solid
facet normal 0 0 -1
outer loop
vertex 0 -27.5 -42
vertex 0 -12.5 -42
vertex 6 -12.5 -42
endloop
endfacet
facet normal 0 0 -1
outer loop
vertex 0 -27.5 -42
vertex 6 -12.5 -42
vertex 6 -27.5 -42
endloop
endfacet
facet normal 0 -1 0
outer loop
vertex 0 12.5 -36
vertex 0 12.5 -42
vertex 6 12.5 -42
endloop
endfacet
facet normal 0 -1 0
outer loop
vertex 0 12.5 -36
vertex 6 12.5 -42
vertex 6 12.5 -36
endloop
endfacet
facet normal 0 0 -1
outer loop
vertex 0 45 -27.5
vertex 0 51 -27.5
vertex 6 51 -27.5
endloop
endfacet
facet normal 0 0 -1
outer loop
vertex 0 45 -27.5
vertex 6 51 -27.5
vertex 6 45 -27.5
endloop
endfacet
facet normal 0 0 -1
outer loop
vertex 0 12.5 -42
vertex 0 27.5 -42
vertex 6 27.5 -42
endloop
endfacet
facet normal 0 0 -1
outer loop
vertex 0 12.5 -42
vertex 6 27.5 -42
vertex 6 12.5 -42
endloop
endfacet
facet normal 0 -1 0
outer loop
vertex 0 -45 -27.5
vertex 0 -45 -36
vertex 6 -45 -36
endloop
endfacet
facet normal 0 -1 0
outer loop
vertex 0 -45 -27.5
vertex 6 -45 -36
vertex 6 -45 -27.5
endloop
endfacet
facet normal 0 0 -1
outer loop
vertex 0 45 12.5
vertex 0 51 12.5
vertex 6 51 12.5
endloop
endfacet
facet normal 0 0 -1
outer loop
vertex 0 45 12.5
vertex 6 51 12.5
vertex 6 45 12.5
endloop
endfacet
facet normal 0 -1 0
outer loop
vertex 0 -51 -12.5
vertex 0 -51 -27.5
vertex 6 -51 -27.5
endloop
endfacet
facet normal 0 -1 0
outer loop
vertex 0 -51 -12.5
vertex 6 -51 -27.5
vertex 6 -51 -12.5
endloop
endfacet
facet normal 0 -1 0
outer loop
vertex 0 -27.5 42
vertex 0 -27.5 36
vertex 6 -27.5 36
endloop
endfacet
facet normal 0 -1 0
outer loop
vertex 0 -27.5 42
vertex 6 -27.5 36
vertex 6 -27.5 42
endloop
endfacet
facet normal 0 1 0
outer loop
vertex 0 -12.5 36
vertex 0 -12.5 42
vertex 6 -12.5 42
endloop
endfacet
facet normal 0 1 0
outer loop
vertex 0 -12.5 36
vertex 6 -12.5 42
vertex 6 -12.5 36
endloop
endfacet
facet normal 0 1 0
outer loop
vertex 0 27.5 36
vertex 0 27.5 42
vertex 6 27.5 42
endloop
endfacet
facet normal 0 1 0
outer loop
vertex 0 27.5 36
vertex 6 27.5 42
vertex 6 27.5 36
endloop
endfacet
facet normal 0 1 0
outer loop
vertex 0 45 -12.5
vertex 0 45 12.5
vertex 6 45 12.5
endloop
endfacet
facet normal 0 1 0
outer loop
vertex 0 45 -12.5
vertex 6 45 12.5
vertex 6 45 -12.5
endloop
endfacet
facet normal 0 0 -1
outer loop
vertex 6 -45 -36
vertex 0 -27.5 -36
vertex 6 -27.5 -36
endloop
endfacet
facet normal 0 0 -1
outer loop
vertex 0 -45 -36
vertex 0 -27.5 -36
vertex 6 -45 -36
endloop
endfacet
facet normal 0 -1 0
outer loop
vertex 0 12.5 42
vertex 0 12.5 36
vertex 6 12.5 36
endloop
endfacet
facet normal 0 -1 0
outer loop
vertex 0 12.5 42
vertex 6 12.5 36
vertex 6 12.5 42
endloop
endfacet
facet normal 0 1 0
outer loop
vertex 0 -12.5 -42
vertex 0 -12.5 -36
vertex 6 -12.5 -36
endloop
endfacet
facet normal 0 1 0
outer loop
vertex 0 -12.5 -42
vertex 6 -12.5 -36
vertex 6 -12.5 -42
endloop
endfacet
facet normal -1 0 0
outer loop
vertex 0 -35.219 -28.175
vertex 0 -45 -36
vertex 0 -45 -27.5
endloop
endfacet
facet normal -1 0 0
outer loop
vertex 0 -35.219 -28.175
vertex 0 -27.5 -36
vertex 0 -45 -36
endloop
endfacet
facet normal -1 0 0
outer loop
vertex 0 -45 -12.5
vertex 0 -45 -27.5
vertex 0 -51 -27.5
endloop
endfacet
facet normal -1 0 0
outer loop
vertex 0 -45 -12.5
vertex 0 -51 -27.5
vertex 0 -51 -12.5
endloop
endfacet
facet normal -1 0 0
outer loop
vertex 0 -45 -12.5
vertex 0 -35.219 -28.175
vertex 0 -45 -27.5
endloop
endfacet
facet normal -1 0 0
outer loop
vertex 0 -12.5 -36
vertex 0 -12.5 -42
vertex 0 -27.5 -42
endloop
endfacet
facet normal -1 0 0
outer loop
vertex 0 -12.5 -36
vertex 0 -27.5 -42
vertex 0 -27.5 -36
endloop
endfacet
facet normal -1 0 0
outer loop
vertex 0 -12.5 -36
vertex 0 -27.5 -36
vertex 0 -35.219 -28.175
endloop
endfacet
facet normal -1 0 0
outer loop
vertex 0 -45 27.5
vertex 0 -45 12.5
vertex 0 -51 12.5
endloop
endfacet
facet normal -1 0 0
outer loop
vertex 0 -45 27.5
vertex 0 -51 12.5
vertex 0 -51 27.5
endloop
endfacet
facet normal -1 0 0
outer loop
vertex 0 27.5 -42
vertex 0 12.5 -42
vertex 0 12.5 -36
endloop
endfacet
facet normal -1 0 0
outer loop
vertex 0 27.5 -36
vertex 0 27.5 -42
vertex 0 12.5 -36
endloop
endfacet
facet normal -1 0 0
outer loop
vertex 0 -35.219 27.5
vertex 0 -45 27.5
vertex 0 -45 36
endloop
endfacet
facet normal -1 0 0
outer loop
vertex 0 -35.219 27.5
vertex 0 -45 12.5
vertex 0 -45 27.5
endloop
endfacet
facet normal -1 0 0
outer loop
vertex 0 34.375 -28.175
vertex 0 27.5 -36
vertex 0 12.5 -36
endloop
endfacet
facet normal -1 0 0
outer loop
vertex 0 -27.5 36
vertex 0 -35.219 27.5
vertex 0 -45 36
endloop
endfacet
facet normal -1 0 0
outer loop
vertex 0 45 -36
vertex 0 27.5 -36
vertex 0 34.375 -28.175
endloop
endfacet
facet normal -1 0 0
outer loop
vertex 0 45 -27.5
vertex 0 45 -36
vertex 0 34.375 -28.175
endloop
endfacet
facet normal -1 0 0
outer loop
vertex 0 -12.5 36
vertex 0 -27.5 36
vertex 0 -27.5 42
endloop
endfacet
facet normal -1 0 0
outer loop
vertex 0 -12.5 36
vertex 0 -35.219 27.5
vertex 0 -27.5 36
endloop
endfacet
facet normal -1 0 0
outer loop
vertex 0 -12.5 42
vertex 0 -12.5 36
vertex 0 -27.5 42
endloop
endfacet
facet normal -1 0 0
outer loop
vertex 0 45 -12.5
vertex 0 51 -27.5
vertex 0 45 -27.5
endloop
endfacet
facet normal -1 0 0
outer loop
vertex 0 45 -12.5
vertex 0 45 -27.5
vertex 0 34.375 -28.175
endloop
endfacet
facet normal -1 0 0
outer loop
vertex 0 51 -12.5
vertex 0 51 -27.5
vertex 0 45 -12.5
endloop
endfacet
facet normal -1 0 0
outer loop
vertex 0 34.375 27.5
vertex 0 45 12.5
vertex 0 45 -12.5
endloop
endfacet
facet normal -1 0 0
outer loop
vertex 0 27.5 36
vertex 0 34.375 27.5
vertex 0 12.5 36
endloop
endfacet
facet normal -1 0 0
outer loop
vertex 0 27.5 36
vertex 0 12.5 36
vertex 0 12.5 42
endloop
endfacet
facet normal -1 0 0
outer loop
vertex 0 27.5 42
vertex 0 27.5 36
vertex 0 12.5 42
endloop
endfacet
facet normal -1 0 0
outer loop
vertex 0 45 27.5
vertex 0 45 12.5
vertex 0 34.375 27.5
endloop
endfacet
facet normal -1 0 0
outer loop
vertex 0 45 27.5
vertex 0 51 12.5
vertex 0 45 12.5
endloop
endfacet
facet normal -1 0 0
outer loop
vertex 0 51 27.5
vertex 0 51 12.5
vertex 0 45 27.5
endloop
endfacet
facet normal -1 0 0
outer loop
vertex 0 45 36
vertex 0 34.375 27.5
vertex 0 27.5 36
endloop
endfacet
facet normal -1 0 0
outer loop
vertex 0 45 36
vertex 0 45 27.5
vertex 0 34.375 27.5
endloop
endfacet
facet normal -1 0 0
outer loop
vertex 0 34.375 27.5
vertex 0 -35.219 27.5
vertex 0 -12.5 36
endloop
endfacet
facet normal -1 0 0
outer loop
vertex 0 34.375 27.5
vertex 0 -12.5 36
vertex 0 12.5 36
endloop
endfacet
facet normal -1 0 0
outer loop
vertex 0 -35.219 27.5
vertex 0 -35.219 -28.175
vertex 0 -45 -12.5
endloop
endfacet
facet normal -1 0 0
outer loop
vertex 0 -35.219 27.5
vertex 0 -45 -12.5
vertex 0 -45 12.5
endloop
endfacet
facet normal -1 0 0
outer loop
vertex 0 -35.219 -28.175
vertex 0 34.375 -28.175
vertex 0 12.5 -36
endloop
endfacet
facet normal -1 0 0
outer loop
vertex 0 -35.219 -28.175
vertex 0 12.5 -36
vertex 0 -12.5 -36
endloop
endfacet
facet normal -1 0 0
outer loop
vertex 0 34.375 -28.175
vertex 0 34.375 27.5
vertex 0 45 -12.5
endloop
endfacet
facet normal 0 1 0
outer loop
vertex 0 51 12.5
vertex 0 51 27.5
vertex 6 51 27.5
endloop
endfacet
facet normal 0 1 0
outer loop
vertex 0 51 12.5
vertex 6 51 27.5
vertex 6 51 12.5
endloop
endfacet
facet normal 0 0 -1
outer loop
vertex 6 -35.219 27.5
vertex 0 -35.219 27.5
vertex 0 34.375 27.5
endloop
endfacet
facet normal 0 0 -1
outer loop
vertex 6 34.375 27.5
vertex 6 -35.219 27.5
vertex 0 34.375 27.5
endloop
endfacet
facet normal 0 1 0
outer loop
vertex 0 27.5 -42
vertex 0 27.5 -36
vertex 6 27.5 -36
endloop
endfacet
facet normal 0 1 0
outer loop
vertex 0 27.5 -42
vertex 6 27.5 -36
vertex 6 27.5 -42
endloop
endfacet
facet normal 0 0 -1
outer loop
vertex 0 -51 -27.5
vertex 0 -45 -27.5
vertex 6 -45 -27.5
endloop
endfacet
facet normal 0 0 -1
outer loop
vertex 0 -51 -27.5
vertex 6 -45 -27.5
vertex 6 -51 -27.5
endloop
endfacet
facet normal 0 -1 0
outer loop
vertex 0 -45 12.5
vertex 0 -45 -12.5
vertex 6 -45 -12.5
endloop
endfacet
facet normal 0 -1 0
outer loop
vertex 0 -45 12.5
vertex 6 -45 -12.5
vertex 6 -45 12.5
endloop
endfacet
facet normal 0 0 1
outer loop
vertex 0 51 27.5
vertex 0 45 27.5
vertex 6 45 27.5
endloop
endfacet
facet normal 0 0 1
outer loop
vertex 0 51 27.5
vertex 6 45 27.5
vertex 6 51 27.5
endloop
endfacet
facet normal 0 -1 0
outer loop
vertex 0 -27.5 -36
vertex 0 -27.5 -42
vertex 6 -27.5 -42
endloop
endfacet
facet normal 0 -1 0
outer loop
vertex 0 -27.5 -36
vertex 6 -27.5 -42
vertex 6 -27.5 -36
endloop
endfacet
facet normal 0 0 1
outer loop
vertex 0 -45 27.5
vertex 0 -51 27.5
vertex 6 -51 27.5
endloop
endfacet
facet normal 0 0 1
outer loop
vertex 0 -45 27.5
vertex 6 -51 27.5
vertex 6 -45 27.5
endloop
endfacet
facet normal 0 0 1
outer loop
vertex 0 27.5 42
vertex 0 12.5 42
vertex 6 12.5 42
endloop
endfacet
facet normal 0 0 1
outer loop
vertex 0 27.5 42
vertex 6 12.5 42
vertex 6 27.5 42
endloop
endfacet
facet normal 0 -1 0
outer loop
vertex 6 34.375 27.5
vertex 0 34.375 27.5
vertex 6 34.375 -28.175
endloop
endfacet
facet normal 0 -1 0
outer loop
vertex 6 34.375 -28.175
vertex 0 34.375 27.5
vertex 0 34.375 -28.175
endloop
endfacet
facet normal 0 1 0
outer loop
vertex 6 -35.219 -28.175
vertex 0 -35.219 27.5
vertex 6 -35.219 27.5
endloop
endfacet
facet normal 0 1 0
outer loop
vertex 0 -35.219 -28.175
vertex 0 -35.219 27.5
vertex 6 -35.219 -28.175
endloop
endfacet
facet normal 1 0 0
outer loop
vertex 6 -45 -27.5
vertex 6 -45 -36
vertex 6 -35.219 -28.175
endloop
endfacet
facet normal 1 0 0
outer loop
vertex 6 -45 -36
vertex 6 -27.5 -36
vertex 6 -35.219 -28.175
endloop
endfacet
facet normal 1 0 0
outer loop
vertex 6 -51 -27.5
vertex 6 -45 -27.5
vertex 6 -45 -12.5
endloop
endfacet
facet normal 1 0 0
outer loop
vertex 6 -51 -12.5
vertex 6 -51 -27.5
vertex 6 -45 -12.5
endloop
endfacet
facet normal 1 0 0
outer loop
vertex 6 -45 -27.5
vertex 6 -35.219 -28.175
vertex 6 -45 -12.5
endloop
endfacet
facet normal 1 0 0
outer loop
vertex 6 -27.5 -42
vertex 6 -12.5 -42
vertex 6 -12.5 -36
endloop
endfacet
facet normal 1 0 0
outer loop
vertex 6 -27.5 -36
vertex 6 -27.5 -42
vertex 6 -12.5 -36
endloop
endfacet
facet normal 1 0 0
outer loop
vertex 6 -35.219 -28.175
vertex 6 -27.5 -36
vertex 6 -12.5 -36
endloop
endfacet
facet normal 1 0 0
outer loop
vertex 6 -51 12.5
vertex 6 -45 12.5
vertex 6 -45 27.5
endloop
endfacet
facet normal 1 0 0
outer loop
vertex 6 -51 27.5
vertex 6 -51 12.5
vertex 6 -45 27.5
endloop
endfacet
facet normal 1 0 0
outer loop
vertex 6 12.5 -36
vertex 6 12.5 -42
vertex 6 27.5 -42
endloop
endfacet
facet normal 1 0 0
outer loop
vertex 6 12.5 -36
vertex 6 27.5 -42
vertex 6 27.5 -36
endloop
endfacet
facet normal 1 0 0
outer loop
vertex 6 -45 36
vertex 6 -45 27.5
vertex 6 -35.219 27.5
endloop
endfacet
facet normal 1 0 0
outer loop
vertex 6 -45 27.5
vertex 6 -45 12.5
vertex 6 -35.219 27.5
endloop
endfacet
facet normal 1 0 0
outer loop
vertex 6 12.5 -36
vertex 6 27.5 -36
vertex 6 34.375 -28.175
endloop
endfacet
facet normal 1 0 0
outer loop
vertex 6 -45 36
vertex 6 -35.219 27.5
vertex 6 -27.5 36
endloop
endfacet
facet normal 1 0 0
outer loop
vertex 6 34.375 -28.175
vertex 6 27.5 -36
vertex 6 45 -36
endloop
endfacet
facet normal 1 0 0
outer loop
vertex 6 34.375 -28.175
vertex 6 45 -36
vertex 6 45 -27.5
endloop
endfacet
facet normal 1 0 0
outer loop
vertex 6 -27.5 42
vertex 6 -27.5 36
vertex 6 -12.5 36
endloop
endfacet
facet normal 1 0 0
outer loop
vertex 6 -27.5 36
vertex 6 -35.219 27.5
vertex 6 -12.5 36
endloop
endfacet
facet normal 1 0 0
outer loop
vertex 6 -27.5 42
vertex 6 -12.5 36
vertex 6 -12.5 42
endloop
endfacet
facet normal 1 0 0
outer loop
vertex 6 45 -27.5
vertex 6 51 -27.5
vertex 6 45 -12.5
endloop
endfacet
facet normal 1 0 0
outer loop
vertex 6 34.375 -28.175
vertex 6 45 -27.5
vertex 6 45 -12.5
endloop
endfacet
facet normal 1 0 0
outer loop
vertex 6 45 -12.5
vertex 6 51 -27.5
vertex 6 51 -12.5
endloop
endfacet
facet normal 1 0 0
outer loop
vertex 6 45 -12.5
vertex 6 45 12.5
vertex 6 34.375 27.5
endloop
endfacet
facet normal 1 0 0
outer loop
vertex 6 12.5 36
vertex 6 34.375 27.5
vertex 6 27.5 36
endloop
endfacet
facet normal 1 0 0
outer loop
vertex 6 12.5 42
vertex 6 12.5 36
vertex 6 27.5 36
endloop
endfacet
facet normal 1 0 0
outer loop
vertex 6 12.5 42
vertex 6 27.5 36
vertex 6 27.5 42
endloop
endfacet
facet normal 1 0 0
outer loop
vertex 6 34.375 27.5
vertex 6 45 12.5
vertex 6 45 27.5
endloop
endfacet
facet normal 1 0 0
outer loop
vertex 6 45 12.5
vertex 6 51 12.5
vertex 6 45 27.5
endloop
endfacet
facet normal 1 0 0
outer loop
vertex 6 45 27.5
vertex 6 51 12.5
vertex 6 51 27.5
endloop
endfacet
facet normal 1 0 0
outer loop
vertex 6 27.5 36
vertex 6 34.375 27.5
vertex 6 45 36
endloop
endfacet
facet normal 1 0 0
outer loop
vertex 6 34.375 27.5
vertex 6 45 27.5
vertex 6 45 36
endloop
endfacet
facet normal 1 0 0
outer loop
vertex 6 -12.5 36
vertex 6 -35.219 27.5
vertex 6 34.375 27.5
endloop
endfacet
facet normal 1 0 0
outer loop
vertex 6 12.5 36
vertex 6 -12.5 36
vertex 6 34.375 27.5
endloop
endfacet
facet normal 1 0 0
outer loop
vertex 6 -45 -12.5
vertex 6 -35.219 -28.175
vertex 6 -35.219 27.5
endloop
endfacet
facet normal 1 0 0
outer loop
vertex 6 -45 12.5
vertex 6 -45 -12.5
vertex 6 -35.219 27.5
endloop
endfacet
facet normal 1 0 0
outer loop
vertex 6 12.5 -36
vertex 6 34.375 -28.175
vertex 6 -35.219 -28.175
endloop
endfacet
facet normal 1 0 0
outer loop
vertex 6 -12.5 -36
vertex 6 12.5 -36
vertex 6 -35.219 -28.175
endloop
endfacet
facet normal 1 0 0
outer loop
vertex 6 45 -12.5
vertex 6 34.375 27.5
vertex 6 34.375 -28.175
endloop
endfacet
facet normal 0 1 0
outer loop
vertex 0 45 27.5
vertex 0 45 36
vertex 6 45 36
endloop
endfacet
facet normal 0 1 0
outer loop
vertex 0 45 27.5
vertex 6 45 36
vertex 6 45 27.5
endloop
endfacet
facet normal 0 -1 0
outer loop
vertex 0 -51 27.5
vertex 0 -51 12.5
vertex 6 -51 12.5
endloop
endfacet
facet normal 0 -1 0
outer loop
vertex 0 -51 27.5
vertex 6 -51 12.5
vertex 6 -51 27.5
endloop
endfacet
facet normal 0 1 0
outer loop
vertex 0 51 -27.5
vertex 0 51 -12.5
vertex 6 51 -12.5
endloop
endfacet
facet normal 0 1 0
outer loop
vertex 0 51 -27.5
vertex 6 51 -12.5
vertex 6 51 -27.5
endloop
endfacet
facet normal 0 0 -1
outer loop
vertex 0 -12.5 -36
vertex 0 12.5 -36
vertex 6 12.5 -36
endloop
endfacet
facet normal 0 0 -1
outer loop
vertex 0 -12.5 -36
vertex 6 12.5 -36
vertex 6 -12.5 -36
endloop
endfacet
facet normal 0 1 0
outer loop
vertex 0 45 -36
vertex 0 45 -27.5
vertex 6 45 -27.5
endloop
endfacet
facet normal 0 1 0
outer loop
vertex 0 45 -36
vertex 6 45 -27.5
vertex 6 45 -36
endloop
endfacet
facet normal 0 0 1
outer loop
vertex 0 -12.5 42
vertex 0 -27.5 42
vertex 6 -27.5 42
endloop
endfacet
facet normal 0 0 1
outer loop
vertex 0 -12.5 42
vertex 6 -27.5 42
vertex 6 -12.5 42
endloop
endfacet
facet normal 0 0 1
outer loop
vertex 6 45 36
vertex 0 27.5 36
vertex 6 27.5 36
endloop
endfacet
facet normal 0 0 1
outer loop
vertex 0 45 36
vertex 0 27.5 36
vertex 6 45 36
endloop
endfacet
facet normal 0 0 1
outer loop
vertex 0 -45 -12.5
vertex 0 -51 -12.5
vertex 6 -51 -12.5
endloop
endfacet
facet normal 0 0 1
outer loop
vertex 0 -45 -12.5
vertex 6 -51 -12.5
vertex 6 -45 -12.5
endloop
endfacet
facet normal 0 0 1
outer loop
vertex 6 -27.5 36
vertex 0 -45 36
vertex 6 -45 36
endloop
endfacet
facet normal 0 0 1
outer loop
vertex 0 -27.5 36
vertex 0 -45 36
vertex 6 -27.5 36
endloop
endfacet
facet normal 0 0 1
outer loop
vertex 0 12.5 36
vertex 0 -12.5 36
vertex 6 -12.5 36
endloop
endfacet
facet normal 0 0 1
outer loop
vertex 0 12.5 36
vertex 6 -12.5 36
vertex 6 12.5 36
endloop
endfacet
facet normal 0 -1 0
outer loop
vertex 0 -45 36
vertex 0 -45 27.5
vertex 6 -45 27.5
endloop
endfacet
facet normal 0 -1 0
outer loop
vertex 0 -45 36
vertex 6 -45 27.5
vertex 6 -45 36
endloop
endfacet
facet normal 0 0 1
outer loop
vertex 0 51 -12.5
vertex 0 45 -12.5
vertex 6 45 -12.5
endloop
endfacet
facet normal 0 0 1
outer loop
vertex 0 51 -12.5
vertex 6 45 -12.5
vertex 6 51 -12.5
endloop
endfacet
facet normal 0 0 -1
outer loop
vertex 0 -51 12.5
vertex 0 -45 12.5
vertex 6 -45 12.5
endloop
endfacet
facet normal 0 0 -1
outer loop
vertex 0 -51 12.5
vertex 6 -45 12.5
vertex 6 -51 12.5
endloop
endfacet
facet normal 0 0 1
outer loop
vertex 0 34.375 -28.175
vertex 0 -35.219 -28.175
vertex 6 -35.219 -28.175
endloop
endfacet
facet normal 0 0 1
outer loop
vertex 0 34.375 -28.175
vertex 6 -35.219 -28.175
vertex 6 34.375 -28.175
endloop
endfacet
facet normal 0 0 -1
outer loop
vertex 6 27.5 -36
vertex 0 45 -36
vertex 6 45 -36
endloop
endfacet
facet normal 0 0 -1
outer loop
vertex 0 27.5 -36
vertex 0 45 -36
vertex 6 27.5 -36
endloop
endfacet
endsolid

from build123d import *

# Parameters (mm, degrees)
SKETCH1_W           = 55.675357375
SKETCH1_H           = 69.594196719
BOSS_EXTRUDE1_DEPTH = 6


with BuildPart() as part:
    # Sketch1 → Boss-Extrude1 (new body)
    with BuildSketch(Plane(origin=(0, 0, 0), x_dir=(0, 0, -1), z_dir=(1, 0, 0))):
        Polygon((36, -45), (27.5, -45), (27.5, -51), (12.5, -51), (12.5, -45), (-12.5, -45), (-12.5, -51), (-27.5, -51), (-27.5, -45), (-36, -45), (-36, -27.5), (-42, -27.5), (-42, -12.5), (-36, -12.5), (-36, 12.5), (-42, 12.5), (-42, 27.5), (-36, 27.5), (-36, 45), (-27.5, 45), (-27.5, 51), (-12.5, 51), (-12.5, 45), (12.5, 45), (12.5, 51), (27.5, 51), (27.5, 45), (36, 45), (36, 27.5), (42, 27.5), (42, 12.5), (36, 12.5), (36, -12.5), (42, -12.5), (42, -27.5), (36, -27.5), align=None)
        with Locations((0.337678688, -0.42209836)):
            Rectangle(SKETCH1_W, SKETCH1_H, mode=Mode.SUBTRACT)
    extrude(amount=BOSS_EXTRUDE1_DEPTH)


solid = part.part
